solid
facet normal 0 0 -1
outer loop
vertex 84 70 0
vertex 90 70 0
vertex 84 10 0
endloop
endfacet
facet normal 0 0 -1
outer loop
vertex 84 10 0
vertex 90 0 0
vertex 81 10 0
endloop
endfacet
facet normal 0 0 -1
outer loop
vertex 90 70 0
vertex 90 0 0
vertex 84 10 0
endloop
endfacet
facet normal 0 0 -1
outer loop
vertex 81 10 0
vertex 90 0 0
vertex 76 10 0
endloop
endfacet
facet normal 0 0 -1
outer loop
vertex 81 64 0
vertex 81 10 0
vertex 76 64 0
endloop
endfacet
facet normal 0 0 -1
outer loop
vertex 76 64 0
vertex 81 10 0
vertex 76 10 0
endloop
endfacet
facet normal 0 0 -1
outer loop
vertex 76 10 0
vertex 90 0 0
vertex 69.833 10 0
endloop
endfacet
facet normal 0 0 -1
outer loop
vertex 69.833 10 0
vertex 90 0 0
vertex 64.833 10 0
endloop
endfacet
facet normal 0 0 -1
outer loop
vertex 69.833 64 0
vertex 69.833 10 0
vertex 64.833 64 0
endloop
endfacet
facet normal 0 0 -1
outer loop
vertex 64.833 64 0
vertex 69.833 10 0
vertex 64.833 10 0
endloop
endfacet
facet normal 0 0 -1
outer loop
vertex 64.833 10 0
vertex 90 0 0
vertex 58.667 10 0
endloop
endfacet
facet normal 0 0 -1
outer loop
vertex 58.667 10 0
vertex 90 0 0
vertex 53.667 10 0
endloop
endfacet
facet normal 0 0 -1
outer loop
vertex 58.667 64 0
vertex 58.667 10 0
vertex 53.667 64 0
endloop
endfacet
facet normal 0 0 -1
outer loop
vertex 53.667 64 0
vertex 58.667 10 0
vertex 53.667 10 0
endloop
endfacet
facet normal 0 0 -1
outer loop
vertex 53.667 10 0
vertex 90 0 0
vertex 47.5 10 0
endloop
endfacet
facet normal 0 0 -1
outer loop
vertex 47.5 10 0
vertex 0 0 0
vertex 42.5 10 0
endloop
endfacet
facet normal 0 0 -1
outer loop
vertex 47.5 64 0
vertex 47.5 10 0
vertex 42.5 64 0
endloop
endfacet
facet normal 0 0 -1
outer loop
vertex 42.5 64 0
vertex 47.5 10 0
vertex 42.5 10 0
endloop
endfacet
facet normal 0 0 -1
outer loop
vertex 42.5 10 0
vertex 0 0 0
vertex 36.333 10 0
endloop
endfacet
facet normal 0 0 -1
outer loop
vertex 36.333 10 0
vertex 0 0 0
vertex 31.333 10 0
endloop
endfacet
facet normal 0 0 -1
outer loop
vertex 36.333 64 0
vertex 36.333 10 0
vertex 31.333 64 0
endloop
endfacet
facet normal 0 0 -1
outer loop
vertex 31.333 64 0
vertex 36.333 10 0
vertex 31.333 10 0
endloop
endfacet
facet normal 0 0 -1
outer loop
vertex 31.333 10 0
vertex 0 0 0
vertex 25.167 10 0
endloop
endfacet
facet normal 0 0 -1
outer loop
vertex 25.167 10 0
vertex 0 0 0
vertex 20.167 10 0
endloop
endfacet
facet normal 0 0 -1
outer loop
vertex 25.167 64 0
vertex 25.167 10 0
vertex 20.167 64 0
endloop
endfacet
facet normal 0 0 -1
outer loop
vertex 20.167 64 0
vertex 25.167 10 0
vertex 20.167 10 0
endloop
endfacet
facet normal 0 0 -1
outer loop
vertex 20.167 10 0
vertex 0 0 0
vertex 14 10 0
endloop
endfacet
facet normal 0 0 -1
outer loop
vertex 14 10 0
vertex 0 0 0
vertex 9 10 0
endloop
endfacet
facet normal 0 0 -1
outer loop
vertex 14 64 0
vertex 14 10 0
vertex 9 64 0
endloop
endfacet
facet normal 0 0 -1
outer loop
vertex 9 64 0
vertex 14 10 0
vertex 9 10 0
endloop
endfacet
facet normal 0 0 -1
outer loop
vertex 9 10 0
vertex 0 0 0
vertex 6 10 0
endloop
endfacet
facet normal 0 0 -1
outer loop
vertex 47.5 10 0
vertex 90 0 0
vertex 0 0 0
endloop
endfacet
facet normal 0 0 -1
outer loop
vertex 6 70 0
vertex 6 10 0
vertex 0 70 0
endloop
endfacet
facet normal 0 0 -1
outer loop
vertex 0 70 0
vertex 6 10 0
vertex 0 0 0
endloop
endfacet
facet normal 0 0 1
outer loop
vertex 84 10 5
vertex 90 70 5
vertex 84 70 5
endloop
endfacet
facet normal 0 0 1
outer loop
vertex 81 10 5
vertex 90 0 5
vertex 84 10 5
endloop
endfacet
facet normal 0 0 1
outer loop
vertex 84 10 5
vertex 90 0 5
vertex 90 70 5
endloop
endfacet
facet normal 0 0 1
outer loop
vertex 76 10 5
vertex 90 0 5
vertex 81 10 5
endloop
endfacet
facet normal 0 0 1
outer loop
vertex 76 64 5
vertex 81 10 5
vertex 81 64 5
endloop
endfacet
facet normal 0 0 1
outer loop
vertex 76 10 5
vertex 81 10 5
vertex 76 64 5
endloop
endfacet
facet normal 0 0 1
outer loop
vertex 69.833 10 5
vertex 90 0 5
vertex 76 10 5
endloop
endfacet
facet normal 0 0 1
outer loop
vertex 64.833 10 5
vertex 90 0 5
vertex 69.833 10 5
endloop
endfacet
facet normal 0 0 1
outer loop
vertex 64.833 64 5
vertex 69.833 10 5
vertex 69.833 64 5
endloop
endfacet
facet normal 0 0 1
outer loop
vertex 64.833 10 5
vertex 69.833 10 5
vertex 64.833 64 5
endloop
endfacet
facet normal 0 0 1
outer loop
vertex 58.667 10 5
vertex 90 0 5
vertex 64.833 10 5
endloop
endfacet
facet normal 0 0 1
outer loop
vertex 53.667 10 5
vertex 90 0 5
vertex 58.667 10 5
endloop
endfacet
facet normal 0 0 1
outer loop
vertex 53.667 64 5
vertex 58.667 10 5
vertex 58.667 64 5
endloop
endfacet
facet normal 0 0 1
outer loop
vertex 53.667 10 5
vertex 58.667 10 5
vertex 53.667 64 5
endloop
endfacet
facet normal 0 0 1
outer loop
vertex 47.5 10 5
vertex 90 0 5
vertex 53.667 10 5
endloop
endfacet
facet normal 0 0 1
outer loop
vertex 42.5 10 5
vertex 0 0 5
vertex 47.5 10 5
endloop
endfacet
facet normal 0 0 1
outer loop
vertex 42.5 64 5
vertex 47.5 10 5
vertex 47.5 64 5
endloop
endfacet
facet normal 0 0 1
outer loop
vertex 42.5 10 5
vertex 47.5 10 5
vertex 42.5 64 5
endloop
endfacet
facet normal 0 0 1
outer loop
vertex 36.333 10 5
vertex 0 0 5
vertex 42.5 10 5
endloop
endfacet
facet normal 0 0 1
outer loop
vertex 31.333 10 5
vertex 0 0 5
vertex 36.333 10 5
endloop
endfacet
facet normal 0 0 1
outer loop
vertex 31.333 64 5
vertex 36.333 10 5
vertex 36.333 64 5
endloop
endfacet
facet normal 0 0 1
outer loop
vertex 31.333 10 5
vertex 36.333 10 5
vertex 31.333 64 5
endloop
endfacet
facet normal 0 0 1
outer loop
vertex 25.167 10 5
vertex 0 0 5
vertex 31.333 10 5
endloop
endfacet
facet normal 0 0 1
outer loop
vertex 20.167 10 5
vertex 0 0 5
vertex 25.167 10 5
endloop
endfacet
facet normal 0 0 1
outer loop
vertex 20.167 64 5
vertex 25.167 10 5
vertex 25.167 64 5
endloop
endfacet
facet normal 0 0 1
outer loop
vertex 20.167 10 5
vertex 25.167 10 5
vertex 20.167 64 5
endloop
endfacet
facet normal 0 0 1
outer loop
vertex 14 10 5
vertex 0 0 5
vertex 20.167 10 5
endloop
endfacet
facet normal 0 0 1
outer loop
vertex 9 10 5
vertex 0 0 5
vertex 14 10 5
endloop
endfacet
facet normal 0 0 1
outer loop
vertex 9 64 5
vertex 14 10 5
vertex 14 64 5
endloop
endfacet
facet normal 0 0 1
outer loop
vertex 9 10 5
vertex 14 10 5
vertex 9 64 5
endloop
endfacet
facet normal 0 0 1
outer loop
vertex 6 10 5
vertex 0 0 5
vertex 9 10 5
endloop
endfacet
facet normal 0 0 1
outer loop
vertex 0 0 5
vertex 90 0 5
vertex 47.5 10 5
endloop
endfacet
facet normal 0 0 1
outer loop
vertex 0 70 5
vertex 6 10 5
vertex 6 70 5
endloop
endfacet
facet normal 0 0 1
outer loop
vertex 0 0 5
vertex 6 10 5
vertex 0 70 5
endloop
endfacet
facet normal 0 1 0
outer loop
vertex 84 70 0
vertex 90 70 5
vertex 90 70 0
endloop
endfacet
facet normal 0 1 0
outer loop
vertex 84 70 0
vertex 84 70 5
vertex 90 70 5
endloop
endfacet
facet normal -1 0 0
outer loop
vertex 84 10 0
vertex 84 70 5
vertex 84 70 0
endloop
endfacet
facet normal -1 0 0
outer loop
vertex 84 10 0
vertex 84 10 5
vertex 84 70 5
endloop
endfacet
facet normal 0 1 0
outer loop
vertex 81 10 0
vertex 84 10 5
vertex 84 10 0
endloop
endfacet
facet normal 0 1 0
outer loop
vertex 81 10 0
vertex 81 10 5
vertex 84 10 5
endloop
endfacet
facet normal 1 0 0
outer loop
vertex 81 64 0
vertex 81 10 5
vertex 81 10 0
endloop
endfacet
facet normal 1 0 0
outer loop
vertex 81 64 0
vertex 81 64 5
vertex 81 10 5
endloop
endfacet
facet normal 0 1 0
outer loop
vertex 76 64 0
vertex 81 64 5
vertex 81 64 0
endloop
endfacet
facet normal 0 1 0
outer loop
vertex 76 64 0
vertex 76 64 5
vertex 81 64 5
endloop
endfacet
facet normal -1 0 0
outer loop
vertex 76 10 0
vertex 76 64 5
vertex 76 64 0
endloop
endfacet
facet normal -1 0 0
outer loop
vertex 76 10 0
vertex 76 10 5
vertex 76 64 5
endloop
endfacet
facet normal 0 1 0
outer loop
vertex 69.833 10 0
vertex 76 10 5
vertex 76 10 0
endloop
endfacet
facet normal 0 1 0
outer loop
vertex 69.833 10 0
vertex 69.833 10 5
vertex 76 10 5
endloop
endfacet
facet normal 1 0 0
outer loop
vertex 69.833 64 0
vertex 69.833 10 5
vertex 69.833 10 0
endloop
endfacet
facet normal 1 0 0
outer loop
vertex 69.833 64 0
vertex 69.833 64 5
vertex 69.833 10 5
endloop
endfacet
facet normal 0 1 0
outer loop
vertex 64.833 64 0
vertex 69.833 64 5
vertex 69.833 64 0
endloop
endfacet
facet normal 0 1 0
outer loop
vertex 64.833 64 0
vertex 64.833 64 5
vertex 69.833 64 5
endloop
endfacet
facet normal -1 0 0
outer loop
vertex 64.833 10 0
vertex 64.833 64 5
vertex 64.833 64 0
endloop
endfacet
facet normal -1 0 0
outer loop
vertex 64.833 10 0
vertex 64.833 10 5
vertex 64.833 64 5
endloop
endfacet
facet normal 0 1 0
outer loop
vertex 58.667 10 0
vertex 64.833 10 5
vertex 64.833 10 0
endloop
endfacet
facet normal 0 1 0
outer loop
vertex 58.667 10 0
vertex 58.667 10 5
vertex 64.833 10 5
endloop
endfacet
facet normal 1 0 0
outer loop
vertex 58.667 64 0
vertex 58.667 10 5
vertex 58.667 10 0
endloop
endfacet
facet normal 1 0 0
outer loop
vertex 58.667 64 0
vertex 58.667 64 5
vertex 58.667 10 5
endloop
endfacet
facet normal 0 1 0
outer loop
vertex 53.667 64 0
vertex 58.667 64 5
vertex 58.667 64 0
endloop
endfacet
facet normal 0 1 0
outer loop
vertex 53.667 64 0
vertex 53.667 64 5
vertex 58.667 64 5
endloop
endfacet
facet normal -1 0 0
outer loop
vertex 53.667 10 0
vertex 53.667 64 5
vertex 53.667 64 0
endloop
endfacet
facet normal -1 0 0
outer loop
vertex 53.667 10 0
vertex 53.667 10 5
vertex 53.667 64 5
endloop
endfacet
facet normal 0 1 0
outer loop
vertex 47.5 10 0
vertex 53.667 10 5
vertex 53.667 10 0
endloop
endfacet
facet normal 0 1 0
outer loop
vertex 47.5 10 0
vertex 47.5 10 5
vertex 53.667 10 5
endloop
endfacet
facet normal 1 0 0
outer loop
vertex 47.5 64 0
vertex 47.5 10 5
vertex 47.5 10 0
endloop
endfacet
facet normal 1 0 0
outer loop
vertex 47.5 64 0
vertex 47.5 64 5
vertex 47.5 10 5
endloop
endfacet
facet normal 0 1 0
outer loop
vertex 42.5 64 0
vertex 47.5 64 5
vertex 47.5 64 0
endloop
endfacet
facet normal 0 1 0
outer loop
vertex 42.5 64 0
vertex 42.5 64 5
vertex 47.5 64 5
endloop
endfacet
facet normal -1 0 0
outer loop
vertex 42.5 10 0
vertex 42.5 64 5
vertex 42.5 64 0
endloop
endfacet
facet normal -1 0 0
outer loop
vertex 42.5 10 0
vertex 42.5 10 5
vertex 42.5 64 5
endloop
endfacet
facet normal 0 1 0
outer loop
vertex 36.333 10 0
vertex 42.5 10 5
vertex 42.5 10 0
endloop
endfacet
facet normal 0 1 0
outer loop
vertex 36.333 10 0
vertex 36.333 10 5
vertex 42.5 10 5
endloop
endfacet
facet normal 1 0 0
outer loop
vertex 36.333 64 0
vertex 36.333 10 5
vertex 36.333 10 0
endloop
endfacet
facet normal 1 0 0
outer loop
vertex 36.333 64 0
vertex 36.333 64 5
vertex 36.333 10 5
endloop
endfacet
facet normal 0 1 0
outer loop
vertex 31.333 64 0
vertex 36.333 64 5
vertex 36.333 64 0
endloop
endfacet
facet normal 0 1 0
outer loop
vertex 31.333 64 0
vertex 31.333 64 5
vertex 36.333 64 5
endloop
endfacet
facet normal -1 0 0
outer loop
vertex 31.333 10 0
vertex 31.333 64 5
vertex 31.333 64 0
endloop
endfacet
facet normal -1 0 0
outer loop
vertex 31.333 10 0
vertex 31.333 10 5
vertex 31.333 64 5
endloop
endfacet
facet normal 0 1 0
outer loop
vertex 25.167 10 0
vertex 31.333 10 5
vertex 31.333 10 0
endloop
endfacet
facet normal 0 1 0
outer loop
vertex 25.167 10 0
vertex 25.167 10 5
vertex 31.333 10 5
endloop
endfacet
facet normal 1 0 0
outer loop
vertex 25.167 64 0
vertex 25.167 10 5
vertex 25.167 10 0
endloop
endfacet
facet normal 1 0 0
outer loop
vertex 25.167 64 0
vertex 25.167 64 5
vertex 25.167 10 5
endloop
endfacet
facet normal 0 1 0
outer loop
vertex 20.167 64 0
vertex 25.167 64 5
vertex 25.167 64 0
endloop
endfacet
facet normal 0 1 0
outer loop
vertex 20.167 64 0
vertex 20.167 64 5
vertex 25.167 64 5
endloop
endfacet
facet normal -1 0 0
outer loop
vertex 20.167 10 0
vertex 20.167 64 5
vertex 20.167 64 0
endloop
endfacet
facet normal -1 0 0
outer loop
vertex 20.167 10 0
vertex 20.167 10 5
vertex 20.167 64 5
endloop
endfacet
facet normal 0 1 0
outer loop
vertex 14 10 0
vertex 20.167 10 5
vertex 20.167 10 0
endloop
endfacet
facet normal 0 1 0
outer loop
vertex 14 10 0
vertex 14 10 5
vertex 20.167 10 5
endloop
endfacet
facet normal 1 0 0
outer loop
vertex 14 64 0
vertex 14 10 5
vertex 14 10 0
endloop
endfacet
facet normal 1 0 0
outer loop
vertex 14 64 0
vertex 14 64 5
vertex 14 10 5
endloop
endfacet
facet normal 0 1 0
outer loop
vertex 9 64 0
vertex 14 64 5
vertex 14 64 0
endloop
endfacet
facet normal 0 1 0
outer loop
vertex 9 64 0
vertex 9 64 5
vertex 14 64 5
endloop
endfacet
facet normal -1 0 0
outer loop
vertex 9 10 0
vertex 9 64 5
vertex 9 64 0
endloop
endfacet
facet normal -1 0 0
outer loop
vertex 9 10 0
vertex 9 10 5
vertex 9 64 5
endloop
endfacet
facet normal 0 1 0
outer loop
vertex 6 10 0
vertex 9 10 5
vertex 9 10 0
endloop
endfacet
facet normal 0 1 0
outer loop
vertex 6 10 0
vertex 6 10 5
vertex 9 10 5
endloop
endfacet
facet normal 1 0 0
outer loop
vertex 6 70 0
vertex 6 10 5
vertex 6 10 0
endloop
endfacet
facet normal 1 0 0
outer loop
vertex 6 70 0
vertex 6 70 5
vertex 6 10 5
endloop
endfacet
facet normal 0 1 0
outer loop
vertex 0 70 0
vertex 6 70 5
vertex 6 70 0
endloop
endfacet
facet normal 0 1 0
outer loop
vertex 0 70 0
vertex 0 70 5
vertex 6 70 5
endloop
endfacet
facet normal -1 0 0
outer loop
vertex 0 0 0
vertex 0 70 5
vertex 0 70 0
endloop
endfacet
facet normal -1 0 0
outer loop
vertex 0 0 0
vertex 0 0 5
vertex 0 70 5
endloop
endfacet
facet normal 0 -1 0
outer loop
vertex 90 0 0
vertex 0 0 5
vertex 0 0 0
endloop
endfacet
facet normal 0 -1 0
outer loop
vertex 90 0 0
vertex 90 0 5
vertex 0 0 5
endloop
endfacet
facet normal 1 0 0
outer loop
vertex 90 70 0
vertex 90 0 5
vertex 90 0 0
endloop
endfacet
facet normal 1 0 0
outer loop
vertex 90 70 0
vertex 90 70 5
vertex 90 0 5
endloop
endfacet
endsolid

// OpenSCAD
$fn = 32;

// ----------------------------------------------------------------------
// Guard grille: 7 slats over a 90 x 70 mm plate
// ----------------------------------------------------------------------

// --- parameters (mm) ---
profile_height = 5;       // extrusion height
profile_points = 36;      // points of the closed outline

profile = [[0, 0], [90, 0], [90, 70], [84, 70], [84, 10], [81, 10], [81, 64], [76, 64], [76, 10], [69.833, 10], [69.833, 64], [64.833, 64], [64.833, 10], [58.667, 10], [58.667, 64], [53.667, 64], [53.667, 10], [47.5, 10], [47.5, 64], [42.5, 64], [42.5, 10], [36.333, 10], [36.333, 64], [31.333, 64], [31.333, 10], [25.167, 10], [25.167, 64], [20.167, 64], [20.167, 10], [14, 10], [14, 64], [9, 64], [9, 10], [6, 10], [6, 70], [0, 70]];  // single closed polygon, 36 points, counter clockwise

// --- the one profile operation ---
linear_extrude(height = profile_height) polygon(points = profile);
